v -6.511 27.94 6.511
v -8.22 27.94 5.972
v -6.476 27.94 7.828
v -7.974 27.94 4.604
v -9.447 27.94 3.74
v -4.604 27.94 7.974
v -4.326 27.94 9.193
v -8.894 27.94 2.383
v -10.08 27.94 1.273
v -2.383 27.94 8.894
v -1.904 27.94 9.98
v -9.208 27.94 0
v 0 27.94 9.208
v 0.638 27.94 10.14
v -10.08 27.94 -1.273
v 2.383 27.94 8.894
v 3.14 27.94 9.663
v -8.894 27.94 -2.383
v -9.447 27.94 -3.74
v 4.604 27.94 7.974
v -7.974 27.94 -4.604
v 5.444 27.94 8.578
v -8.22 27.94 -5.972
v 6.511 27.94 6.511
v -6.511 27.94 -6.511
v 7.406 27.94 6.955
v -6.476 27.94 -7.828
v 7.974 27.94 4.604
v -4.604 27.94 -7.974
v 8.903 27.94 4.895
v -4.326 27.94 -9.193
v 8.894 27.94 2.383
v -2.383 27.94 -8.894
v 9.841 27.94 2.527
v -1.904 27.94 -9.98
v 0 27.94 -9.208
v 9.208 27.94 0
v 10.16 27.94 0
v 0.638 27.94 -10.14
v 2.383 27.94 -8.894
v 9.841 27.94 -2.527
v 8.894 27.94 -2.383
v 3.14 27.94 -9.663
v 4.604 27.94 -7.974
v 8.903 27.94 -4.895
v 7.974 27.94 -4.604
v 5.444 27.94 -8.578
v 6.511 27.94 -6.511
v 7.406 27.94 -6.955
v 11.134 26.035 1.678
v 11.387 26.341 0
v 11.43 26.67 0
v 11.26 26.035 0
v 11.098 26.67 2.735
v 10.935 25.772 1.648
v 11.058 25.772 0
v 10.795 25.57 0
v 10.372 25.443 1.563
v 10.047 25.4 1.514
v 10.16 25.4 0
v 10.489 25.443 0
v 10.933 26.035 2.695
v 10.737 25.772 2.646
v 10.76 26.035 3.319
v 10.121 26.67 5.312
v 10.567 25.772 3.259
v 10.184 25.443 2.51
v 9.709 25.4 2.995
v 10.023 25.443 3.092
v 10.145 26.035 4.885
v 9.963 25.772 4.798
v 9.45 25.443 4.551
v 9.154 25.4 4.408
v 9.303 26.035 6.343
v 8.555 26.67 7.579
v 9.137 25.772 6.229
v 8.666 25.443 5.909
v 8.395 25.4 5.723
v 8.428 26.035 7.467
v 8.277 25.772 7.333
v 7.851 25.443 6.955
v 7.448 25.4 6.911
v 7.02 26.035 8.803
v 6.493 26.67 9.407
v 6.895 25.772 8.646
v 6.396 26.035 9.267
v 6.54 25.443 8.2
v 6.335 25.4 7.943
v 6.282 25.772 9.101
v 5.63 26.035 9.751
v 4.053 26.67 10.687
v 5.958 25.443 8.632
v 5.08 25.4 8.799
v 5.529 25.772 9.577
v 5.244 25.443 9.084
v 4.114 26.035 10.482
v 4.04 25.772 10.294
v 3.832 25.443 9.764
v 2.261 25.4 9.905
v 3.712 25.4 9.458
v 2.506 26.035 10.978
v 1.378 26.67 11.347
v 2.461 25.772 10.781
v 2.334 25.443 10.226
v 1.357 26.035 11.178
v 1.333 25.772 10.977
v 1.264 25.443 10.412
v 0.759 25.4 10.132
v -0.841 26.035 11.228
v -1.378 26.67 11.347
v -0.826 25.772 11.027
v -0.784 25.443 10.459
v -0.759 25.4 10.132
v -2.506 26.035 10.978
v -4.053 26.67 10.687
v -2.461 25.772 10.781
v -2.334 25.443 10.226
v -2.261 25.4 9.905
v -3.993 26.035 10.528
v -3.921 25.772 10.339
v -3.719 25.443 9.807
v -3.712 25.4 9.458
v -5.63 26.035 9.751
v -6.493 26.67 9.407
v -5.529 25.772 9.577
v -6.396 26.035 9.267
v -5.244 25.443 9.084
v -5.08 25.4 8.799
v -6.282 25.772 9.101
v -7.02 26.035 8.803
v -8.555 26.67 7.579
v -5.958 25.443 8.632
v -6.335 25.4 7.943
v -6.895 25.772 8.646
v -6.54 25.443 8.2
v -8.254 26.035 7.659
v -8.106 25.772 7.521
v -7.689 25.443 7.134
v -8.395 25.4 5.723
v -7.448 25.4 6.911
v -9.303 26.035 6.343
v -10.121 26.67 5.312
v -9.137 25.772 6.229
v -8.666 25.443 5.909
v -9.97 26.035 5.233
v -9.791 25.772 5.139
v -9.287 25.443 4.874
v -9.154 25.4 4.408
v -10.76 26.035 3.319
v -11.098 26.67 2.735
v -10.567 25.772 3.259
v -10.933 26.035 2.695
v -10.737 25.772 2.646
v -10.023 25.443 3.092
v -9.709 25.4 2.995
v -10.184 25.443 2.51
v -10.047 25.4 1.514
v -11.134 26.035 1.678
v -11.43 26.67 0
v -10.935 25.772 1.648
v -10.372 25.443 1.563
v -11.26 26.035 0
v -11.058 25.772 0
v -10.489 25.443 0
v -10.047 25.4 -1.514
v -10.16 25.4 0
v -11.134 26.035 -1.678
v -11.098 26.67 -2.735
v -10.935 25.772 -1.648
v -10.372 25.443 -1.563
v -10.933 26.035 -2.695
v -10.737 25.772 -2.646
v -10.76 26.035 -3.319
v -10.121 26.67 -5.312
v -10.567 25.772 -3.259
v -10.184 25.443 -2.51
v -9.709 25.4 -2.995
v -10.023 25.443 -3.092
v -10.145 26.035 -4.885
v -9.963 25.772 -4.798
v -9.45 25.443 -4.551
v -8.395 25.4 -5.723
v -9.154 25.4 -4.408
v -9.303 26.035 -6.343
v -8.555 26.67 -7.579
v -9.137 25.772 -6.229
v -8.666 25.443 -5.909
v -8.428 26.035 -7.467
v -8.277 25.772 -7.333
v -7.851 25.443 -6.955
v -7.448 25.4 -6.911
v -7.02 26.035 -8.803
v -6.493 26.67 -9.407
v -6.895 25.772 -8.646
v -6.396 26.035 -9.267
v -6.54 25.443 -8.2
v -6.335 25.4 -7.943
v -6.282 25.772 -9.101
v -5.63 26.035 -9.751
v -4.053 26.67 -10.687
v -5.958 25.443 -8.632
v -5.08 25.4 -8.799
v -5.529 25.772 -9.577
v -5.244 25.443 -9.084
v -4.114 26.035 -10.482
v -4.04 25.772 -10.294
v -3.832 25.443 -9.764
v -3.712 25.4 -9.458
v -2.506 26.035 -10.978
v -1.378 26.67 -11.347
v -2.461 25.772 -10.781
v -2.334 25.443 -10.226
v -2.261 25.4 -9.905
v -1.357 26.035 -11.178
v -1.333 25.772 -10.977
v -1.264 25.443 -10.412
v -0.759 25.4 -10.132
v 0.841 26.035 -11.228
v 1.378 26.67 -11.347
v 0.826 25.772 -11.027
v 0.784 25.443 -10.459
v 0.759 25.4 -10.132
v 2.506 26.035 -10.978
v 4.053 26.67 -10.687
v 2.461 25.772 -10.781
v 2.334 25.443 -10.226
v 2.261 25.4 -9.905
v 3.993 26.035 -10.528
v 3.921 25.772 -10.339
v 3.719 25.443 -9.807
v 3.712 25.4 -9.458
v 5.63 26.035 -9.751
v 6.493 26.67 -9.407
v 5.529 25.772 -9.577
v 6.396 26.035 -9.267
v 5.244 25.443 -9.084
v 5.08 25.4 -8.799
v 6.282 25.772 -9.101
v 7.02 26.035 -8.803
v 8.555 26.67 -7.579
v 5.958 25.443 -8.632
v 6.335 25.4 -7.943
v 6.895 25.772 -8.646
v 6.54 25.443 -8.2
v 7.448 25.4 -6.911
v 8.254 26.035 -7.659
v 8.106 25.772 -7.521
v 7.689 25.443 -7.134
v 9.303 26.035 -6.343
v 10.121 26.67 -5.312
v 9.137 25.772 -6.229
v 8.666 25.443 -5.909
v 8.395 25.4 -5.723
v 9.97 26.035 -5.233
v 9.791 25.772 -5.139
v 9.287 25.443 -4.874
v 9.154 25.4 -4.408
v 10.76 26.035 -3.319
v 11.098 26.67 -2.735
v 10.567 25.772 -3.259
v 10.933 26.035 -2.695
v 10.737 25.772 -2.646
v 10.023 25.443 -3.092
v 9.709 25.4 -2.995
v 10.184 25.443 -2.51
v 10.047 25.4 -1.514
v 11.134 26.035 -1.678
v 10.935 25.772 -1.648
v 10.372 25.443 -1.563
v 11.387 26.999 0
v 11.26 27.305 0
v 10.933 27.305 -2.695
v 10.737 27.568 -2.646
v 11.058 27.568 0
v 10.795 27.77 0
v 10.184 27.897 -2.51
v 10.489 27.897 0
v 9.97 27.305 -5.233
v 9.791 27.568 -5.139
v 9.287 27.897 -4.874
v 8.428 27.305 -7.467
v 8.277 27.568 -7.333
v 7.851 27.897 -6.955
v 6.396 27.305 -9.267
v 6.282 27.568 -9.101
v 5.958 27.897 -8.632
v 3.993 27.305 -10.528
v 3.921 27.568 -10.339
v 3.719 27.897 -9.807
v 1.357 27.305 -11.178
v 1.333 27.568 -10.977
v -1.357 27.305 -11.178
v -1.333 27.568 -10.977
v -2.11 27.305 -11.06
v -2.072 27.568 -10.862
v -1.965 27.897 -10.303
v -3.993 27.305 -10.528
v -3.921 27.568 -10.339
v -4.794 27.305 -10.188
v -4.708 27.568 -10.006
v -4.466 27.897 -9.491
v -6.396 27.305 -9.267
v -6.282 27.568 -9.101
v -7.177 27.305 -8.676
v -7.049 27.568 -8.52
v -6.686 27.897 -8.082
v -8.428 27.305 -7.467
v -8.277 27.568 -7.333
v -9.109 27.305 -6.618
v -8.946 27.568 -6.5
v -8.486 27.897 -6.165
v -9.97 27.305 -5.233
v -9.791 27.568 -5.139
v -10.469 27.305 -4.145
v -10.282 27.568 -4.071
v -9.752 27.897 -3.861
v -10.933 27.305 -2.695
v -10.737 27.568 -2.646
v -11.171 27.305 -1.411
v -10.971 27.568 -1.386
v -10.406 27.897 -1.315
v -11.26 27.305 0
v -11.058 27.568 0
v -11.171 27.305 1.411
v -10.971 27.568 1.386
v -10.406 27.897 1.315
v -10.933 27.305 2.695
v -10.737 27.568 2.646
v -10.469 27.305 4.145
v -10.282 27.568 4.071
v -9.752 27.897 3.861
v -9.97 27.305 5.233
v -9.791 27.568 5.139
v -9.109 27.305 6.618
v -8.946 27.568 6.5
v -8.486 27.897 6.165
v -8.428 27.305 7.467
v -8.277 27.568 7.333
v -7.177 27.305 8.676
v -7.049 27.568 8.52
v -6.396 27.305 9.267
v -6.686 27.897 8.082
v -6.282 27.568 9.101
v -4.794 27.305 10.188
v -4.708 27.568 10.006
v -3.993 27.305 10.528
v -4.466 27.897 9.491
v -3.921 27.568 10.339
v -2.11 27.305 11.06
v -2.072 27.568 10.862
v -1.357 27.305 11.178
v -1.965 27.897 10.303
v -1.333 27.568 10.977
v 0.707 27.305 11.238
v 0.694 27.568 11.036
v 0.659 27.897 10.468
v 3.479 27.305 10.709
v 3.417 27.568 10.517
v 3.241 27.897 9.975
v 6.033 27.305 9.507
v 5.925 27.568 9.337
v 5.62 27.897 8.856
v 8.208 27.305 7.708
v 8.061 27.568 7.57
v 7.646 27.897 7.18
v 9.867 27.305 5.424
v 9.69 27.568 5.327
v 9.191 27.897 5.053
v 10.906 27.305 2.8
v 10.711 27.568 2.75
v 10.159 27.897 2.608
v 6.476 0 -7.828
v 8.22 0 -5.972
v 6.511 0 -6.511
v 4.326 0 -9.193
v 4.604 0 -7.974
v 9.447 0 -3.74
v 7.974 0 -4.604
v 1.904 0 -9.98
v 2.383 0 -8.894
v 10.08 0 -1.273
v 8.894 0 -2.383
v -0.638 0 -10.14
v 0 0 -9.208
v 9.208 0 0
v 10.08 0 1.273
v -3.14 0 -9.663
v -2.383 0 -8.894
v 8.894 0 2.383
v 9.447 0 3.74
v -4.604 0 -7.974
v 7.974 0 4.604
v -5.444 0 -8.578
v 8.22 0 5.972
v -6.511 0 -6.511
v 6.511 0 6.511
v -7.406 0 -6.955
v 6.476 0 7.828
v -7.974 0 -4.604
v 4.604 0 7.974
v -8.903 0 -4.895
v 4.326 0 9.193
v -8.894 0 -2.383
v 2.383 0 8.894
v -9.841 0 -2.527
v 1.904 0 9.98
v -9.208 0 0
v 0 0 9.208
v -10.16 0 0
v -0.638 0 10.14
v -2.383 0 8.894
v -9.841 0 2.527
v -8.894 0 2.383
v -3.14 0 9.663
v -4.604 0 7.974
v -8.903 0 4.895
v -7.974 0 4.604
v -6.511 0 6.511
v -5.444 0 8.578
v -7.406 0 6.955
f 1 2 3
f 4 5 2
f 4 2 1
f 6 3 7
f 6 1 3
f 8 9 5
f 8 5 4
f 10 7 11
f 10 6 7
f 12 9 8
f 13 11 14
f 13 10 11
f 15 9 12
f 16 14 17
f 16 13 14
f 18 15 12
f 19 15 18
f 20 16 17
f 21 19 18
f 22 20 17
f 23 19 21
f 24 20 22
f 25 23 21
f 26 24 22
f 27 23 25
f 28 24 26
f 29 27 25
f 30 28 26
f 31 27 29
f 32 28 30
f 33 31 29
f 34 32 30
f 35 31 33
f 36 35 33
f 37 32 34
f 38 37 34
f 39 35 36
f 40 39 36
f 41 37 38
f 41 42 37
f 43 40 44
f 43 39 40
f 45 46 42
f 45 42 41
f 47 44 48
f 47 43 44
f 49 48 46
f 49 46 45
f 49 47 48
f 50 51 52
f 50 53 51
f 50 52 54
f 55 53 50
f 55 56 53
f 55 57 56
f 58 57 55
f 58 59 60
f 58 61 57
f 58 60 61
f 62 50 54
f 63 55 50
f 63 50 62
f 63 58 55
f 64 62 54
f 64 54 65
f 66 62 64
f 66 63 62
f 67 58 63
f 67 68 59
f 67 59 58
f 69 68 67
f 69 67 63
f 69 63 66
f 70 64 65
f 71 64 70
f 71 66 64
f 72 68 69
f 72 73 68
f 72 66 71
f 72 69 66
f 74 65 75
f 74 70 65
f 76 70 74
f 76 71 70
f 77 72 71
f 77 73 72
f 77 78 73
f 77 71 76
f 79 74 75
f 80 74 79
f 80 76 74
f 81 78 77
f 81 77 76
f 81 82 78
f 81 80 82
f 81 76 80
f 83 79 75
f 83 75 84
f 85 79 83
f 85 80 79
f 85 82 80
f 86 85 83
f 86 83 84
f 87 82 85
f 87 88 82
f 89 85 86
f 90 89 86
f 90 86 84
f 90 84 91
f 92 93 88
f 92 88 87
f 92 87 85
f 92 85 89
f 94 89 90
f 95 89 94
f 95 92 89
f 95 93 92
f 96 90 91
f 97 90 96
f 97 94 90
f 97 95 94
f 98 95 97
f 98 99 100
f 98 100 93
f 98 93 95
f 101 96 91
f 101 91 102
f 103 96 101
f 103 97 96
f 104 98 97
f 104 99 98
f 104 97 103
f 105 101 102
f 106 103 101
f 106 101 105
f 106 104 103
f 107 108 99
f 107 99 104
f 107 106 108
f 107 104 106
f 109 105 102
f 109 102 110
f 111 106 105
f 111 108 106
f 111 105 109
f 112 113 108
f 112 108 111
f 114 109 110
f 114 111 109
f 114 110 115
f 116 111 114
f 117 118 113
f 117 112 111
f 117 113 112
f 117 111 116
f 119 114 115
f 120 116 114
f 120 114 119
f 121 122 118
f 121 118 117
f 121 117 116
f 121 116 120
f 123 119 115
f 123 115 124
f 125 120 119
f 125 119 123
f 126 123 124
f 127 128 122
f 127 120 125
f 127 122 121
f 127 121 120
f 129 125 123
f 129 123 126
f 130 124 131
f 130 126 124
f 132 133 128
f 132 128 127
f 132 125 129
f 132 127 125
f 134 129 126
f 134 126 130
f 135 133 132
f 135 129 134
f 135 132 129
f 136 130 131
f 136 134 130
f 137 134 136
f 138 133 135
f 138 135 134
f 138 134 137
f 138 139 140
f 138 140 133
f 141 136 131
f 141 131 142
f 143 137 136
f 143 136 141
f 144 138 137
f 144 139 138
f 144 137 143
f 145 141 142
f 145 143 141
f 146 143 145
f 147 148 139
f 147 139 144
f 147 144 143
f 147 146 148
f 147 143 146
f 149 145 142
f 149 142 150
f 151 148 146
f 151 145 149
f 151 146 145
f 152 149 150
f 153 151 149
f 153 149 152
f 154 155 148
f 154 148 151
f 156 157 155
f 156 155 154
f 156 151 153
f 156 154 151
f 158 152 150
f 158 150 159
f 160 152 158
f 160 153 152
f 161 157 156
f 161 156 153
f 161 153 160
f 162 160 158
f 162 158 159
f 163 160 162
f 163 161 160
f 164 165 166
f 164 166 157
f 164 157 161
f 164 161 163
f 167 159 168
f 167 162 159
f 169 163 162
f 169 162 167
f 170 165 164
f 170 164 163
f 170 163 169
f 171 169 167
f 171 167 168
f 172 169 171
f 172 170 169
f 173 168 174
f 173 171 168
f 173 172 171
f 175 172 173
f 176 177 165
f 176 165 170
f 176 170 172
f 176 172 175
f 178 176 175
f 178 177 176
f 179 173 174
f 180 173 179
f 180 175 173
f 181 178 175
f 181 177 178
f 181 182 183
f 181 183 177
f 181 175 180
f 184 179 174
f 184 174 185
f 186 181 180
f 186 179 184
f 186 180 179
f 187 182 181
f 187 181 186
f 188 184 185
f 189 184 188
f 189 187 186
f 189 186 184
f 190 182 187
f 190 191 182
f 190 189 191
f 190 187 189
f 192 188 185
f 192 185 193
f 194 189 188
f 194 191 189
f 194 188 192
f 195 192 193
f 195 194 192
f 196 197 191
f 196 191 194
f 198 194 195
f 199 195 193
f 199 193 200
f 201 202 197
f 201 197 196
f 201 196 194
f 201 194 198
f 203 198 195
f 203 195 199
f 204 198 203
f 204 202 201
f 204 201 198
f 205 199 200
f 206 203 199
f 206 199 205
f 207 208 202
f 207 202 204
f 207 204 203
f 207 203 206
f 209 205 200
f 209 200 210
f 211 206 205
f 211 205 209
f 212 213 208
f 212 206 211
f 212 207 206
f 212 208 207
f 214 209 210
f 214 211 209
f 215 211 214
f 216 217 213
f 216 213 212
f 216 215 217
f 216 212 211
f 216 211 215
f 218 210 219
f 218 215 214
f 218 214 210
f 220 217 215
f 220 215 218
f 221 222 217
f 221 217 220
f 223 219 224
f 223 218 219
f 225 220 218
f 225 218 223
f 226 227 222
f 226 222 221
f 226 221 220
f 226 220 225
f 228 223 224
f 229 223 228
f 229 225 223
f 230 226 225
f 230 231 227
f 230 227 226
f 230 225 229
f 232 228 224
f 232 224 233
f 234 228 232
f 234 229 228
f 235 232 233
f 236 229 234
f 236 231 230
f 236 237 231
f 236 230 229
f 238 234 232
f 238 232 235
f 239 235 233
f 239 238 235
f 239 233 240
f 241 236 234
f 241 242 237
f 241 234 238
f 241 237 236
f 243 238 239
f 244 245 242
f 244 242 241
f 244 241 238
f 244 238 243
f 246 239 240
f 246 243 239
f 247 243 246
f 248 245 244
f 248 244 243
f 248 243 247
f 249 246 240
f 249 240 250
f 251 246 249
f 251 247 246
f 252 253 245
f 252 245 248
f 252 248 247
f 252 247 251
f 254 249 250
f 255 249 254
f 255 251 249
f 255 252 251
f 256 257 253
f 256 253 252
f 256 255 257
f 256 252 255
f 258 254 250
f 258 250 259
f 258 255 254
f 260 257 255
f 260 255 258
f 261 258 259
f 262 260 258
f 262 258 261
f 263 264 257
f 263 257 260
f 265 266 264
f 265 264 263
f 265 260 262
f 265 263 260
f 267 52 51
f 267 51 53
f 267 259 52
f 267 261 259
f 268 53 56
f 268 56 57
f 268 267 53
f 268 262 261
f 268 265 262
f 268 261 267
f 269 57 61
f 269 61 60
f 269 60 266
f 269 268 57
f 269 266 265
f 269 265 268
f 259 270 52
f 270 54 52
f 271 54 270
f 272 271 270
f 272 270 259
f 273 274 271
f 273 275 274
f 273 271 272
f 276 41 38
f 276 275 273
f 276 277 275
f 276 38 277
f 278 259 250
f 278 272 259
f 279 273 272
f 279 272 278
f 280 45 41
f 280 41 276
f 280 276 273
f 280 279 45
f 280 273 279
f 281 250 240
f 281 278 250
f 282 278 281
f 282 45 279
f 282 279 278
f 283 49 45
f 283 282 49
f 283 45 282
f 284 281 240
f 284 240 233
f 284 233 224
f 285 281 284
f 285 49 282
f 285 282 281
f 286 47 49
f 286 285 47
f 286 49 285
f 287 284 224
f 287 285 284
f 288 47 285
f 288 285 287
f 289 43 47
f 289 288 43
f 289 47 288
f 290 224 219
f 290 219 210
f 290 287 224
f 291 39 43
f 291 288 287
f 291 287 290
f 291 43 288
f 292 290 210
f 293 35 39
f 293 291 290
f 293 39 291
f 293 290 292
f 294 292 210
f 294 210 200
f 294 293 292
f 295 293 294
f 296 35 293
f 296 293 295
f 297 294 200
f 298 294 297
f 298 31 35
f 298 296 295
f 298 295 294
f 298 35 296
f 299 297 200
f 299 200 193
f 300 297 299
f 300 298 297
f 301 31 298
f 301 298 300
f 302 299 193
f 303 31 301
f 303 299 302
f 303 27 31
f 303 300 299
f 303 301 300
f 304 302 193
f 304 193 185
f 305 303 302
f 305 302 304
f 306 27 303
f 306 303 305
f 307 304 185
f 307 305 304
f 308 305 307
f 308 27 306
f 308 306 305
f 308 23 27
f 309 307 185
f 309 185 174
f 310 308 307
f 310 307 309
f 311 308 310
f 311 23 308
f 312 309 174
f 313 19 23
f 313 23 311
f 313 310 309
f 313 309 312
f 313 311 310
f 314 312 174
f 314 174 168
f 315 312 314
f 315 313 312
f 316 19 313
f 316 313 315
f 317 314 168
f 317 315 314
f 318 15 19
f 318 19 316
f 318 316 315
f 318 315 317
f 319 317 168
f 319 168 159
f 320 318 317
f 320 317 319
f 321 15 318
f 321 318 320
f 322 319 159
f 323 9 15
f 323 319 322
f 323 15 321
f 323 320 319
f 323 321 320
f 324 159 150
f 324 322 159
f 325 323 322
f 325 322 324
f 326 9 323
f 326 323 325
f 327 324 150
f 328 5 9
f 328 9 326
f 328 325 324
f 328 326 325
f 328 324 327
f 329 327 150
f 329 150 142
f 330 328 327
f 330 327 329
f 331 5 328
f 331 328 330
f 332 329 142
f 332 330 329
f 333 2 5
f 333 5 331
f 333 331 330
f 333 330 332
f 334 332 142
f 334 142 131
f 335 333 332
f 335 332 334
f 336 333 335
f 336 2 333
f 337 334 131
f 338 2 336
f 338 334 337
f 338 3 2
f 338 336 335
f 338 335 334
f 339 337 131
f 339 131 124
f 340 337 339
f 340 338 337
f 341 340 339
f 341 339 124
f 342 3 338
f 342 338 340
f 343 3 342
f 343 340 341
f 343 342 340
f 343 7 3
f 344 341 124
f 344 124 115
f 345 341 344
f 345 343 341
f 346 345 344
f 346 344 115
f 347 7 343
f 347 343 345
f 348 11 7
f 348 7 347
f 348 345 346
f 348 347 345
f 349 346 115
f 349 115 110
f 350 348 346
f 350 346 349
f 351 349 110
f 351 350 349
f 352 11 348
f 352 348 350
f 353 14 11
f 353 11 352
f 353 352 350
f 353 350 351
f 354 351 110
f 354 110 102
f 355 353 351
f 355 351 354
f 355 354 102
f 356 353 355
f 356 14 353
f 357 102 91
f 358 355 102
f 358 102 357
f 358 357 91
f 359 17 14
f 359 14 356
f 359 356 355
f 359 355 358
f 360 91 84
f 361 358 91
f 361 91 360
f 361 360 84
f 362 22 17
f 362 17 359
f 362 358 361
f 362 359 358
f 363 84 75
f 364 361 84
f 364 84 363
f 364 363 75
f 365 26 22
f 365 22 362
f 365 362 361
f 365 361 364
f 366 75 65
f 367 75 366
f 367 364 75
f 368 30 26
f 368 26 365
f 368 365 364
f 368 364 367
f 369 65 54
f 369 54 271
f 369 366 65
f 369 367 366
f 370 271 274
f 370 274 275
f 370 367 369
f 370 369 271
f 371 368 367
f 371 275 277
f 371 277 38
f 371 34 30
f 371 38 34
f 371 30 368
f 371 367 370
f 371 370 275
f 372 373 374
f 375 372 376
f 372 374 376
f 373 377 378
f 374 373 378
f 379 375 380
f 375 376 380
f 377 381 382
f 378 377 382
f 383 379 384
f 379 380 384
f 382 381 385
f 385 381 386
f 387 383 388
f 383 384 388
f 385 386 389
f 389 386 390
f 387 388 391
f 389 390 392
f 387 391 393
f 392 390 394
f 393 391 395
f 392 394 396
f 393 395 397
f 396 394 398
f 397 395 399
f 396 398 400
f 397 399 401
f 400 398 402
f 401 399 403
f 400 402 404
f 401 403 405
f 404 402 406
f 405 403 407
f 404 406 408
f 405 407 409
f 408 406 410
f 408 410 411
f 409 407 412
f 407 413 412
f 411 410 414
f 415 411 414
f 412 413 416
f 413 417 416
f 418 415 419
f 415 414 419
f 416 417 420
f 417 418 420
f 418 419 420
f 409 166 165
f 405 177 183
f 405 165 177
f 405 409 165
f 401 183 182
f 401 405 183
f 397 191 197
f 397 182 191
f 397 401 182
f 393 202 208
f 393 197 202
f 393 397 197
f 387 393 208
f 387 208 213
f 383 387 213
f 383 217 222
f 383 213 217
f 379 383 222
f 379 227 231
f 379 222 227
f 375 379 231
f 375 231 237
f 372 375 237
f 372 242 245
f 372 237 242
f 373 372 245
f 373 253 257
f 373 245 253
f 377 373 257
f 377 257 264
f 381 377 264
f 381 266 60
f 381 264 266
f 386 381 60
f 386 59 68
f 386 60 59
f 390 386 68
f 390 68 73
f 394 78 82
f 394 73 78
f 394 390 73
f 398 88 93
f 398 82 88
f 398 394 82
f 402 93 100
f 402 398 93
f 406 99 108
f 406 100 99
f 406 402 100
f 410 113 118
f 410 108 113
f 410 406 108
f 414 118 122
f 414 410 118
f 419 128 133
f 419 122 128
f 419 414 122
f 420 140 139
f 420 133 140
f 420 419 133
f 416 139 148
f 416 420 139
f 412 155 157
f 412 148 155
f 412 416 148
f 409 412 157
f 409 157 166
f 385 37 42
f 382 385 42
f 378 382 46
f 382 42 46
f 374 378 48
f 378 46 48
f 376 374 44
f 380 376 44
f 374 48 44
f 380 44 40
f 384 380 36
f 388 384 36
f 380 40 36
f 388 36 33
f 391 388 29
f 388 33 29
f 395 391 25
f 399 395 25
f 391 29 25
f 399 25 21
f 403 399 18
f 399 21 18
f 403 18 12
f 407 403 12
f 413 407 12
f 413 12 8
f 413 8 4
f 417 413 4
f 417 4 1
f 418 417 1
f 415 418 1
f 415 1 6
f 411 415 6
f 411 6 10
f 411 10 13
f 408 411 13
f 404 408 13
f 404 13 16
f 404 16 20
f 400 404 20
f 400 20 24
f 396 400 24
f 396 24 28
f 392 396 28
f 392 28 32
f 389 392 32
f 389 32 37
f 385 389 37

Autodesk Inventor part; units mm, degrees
ref_plane "YZ Plane" through (0, 0, 0) normal (1, 0, 0) x (0, 1, 0)
ref_plane "XZ Plane" through (0, 0, 0) normal (0, 1, 0) x (-1, 0, 0)
ref_plane "XY Plane" through (0, 0, 0) normal (0, 0, 1) x (1, 0, 0)
sketch "Sketch1" plane through (0, 0, 0) normal (0, 1, 0) x (-1, 0, 0)
  circle A0 centre (0, 0) radius 10.16
  dimension "d0" = 20.32
extrude "Extrusion1" add sketch "Sketch1" along normal blind 25.4
sketch "Sketch2" plane through (0, 25.4, 0) normal (0, 1, 0) x (1, 0, 0)
  circle A0 centre (0, 0) radius 11.43
  dimension "d3" = 22.86
extrude "Extrusion2" add sketch "Sketch2" along normal blind 2.54
fillet "Fillet1" radius 1.27 2 edges at (-11.43, 25.4, 0) (-11.43, 27.94, 0)
sketch "Sketch3" plane through (0, 27.94, 0) normal (0, 1, 0) x (1, 0, 0)
  circle A0 centre (0, 0) radius 9.2075
  dimension "d7" = 18.415
extrude "Extrusion3" cut sketch "Sketch3" against normal blind 31.75
properties part number "Stack of train [Copy]"
